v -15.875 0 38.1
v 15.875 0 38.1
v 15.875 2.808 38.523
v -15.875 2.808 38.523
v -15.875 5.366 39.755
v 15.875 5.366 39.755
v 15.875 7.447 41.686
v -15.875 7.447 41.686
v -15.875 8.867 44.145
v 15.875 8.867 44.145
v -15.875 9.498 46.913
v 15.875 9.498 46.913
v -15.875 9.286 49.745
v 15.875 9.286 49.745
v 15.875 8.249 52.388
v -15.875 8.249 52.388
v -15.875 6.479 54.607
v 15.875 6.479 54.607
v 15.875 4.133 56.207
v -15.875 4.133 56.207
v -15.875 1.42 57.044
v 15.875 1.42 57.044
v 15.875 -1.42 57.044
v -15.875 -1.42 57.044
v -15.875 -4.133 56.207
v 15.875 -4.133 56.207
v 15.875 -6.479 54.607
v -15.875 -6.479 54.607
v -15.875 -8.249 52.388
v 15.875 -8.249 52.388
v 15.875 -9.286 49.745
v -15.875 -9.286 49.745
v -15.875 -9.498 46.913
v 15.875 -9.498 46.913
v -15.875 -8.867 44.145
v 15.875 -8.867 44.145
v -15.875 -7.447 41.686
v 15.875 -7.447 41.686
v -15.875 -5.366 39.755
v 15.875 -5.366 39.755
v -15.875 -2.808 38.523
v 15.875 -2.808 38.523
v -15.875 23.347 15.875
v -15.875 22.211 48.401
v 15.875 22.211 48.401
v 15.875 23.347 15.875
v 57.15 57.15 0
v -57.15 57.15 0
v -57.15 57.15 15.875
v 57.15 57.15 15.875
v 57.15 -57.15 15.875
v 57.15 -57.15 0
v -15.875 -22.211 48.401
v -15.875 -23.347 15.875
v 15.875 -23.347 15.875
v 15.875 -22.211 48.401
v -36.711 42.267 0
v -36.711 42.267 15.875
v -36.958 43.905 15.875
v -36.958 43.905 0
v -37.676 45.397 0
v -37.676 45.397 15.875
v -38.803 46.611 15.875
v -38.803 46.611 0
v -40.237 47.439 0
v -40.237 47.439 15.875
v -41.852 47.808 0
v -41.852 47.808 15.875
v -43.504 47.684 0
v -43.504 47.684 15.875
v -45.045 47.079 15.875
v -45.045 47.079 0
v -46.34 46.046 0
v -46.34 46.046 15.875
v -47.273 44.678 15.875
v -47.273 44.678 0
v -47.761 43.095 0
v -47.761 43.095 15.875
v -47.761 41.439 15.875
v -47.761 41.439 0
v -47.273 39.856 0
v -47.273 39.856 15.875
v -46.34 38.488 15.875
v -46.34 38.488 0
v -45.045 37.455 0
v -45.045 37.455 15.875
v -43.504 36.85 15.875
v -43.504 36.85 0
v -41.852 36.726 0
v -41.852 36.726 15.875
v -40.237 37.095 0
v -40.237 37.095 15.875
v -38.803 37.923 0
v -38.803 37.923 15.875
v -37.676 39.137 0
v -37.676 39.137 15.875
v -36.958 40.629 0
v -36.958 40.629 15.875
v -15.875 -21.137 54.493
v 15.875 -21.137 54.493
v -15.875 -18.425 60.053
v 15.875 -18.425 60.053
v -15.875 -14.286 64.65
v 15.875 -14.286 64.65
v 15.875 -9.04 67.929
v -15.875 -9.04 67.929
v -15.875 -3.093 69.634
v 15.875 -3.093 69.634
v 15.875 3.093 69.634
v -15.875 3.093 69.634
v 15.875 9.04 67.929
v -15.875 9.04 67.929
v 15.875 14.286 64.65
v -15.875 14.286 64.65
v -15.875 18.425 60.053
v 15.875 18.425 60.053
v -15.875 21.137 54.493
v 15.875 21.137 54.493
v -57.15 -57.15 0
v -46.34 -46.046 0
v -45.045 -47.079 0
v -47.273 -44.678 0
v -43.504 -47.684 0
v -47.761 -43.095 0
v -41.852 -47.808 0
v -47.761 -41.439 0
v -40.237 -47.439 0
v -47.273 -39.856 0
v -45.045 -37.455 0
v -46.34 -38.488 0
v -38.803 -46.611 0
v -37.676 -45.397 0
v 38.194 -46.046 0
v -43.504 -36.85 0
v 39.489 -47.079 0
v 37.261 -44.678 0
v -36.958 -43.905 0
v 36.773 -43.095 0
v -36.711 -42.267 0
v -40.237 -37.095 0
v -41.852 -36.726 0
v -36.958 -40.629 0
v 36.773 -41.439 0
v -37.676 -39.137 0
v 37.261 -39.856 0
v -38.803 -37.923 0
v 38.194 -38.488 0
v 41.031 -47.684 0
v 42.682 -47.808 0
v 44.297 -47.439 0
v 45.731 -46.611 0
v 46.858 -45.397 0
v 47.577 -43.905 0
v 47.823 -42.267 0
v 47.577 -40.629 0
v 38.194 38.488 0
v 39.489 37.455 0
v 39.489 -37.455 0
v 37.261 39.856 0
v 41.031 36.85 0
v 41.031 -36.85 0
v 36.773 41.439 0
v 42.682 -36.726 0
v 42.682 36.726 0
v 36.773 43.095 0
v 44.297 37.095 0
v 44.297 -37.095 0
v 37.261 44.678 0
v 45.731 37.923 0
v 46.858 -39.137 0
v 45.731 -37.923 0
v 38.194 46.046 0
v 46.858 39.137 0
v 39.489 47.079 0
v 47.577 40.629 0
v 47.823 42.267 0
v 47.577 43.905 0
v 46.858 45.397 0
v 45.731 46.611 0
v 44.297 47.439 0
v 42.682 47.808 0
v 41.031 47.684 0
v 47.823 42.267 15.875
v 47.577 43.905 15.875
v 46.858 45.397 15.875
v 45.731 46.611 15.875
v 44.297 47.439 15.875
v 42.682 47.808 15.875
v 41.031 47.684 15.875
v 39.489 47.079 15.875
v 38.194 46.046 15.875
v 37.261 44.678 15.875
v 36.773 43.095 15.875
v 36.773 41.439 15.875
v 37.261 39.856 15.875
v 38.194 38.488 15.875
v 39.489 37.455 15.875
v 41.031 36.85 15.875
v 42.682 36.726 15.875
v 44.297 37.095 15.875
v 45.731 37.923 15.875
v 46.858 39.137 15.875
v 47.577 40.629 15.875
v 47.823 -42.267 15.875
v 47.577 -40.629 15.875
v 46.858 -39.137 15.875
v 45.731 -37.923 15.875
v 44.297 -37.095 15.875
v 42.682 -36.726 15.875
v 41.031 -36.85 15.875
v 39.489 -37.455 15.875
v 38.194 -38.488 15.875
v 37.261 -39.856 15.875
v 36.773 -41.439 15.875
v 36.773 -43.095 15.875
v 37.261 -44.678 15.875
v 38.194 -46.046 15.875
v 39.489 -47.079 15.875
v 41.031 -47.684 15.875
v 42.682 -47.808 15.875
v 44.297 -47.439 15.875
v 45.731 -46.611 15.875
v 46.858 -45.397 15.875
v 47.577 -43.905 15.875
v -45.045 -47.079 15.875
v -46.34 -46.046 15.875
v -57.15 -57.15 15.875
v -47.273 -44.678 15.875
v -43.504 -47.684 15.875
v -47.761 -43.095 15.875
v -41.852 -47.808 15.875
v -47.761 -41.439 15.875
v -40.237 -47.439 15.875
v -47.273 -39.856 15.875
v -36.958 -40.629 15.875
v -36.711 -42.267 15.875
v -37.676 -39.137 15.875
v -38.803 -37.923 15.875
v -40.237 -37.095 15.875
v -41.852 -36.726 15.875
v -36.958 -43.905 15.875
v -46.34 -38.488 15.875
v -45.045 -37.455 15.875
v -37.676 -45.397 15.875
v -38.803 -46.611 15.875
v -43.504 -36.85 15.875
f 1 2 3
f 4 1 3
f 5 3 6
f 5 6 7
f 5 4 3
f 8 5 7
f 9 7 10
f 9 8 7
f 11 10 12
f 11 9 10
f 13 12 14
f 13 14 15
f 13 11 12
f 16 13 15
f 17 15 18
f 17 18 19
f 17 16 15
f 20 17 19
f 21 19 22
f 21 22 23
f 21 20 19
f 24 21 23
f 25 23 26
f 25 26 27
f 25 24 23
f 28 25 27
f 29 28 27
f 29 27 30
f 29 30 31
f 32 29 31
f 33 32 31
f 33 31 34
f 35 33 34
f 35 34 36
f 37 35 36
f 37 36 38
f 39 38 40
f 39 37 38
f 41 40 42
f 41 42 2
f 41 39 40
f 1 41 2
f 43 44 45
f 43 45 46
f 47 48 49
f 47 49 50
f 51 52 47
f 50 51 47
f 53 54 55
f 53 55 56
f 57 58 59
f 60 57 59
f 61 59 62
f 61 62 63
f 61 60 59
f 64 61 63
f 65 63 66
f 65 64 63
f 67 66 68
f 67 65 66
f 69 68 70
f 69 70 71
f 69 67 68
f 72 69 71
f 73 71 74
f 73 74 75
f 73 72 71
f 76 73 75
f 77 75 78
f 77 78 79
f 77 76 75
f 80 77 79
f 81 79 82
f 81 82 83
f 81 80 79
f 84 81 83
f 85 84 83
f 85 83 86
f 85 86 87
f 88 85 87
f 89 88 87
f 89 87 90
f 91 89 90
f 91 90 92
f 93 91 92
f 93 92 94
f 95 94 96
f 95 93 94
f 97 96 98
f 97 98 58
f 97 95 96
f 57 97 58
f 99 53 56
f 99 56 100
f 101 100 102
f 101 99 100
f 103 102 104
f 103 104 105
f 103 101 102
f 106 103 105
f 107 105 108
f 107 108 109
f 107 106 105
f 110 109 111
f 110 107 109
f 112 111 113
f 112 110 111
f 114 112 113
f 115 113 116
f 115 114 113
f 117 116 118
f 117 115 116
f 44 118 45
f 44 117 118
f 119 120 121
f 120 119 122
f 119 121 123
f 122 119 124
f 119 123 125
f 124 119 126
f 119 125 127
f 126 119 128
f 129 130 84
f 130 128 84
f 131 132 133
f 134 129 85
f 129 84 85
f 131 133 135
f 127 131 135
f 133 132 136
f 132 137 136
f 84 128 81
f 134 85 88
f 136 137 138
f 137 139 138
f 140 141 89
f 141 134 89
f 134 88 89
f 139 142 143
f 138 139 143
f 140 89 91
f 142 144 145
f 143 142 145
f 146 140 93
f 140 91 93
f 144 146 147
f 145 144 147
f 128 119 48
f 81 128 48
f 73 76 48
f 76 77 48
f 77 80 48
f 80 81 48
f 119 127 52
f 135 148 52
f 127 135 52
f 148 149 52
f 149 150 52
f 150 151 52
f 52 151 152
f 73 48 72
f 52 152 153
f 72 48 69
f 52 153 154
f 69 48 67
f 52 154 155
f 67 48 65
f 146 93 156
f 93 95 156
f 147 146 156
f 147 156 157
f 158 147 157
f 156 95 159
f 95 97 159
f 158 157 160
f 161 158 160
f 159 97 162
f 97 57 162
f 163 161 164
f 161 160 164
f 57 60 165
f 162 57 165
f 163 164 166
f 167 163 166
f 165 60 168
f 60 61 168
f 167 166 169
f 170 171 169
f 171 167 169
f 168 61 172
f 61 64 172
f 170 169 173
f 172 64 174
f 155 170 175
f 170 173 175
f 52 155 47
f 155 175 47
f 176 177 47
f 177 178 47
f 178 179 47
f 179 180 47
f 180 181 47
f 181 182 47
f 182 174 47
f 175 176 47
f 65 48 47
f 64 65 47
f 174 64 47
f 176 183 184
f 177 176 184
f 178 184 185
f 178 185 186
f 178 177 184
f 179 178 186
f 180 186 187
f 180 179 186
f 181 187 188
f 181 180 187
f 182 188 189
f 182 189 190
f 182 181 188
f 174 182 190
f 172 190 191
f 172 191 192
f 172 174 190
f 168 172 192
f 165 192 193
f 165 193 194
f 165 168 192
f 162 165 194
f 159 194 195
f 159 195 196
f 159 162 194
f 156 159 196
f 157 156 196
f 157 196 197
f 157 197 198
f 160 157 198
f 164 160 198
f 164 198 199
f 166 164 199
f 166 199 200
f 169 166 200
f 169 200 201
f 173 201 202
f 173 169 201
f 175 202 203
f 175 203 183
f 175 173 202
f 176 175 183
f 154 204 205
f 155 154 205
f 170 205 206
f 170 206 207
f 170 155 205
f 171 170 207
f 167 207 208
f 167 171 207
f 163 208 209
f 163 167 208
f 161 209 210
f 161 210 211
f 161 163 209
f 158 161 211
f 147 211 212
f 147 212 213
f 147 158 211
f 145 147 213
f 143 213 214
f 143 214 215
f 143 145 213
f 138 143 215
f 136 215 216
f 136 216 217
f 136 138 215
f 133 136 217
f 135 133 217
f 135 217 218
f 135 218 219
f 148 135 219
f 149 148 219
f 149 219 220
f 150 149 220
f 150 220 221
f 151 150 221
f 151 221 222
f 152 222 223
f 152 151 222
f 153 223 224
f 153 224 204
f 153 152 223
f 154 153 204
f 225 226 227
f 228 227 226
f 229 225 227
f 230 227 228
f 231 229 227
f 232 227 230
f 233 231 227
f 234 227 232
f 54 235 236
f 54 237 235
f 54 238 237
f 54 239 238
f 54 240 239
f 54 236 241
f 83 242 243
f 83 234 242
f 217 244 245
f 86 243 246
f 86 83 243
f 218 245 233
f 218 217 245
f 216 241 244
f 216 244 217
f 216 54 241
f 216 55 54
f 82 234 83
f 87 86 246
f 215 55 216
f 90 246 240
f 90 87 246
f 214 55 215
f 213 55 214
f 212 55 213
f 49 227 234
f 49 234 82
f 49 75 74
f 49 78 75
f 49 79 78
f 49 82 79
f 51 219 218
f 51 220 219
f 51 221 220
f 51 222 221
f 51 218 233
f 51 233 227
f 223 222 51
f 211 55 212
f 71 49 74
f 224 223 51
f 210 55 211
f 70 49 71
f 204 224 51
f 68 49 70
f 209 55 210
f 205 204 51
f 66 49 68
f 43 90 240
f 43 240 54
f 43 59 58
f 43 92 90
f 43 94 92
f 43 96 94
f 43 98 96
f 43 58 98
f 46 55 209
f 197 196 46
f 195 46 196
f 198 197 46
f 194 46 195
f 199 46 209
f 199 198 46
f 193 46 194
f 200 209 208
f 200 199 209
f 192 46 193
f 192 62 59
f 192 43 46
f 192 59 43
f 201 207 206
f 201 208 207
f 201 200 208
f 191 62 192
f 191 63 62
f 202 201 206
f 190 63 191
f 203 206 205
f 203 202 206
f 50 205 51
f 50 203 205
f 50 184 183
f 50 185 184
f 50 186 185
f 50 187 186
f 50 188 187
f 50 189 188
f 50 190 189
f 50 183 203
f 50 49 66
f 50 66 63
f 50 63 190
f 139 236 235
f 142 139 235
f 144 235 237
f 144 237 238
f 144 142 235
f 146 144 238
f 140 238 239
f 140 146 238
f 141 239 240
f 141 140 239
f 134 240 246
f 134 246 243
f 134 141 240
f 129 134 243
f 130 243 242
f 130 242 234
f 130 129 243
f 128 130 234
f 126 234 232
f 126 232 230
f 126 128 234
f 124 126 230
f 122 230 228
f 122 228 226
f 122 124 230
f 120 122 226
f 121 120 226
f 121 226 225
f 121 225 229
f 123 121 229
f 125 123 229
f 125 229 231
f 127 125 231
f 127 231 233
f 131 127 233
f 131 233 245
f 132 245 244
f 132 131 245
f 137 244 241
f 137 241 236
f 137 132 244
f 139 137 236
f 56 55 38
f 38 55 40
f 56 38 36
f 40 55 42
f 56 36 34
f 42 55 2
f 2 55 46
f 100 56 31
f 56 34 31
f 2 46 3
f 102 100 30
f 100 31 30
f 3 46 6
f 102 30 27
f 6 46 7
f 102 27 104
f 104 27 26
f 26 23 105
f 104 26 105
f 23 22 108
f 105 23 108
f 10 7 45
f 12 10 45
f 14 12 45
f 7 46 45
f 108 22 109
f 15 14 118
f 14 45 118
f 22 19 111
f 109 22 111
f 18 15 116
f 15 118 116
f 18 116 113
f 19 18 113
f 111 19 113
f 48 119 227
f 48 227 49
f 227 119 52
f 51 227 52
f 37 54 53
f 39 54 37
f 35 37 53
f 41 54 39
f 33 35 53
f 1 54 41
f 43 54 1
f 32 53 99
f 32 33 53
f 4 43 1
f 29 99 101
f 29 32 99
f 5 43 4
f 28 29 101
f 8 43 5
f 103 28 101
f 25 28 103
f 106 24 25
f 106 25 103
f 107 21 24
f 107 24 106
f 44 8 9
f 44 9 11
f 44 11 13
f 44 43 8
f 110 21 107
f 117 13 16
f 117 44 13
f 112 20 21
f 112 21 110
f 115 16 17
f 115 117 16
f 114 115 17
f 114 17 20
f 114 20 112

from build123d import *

# Parameters (mm, degrees)
SKETCH3_W                = 114.3
SKETCH3_H                = 114.3
SKETCH3_R                = 5.55625
BOSS_EXTRUDE1_DEPTH      = 15.875
BOSS_EXTRUDE2_DEPTH      = 15.875
BOSS_EXTRUDE2_DEPTH_BACK = 15.875
SKETCH4_R                = 9.525


with BuildPart() as part:
    # Sketch3 → Boss-Extrude1 (new body)
    with BuildSketch(Plane.XY):
        Rectangle(SKETCH3_W, SKETCH3_H)
        with Locations((-42.2671875, -42.2671875)):
            Circle(SKETCH3_R, mode=Mode.SUBTRACT)
        with Locations((42.2671875, -42.2671875)):
            Circle(SKETCH3_R, mode=Mode.SUBTRACT)
        with Locations((42.2671875, 42.2671875)):
            Circle(SKETCH3_R, mode=Mode.SUBTRACT)
        with Locations((-42.2671875, 42.2671875)):
            Circle(SKETCH3_R, mode=Mode.SUBTRACT)
    extrude(amount=BOSS_EXTRUDE1_DEPTH)

    # Sketch4 → Boss-Extrude2 (add, two sides: drawn at the far end of the back side and taken through both)
    with BuildSketch(Plane(origin=(0, 0, 0), x_dir=(0, 0, -1), z_dir=(1, 0, 0)).offset(-BOSS_EXTRUDE2_DEPTH_BACK)):
        with BuildLine():
            Line((-48.400641314, 22.21146113), (-15.875, 23.347281553))
            Line((-15.875, 23.347281553), (-15.875, -23.347281553))
            Line((-15.875, -23.347281553), (-48.400641314, -22.21146113))
            ThreePointArc((-48.400641314, -22.21146113), (-69.85, 0), (-48.400641314, 22.21146113))
        make_face()
        with Locations((-47.625, 0)):
            Circle(SKETCH4_R, mode=Mode.SUBTRACT)
    extrude(amount=BOSS_EXTRUDE2_DEPTH + BOSS_EXTRUDE2_DEPTH_BACK)


solid = part.part
